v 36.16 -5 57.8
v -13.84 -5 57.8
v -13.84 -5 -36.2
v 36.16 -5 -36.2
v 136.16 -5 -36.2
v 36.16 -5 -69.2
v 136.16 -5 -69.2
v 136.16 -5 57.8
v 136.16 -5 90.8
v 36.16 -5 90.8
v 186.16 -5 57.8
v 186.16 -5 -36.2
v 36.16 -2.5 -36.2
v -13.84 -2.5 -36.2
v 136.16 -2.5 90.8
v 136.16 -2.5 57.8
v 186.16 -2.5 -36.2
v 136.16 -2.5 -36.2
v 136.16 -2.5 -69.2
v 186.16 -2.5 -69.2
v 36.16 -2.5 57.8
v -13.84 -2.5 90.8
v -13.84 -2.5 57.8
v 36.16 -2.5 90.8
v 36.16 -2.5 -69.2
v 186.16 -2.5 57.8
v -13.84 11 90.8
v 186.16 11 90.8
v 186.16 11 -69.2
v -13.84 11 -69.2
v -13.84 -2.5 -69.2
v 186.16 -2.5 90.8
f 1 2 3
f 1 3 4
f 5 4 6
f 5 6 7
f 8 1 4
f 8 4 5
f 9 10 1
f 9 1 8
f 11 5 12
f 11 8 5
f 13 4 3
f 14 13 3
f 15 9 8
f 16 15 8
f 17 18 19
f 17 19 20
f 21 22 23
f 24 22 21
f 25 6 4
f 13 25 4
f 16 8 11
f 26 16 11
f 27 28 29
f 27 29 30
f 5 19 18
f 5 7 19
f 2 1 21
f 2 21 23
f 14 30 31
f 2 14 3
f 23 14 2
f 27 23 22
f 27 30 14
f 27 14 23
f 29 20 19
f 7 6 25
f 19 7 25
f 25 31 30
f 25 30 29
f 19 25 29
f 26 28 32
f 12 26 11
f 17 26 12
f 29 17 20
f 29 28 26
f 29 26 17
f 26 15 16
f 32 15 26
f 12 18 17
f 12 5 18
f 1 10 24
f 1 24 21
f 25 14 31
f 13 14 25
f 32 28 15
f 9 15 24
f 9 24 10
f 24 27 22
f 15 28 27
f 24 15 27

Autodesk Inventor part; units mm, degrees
ref_plane "YZ Plane" through (0, 0, 0) normal (1, 0, 0) x (0, 1, 0)
ref_plane "XZ Plane" through (0, 0, 0) normal (0, 1, 0) x (-1, 0, 0)
ref_plane "XY Plane" through (0, 0, 0) normal (0, 0, 1) x (1, 0, 0)
sketch "Sketch1" plane through (0, 0, 0) normal (0, 1, 0) x (-1, 0, 0)
  line L0 (13.84, 90.8) -> (-186.16, 90.8)
  line L1 (-186.16, 90.8) -> (-186.16, -69.2)
  line L2 (-186.16, -69.2) -> (13.84, -69.2)
  line L3 (13.84, -69.2) -> (13.84, 90.8)
  point P0 (0, 0)
  dimension "d0" = 160
  dimension "d1" = 200
extrude "Extrusion1" add sketch "Sketch1" along normal blind 11
sketch "Sketch2" plane through (186.16, 0, 90.8) normal (1, 0, 0) x (0, 0, -1)
  line L0 (0, 0) -> (0, 11) projected
  line L1 (0, 0) -> (-12, 0)
  line L2 (-12, 0) -> (-12, 60)
  line L3 (-12, 60) -> (0, 60)
  line L4 (0, 60) -> (0, 0)
  line L5 (160, 0) -> (160, 11) projected
  line L6 (160, 0) -> (172, 0)
  line L7 (172, 0) -> (172, 60)
  line L8 (172, 60) -> (160, 60)
  line L9 (160, 60) -> (160, 0)
  point P0 (90.8, 0)
  point P1 (0, 11)
  dimension "d4" = 60
  dimension "d5" = 60
  dimension "d6" = 12
  dimension "d17" = 12
extrude "Extrusion2" add sketch "Sketch2" against normal up to surface (200 mm away)
sketch "Sketch3" plane through (0, 0, 0) normal (0, -1, 0) x (1, 0, 0)
  line L0 (186.16, 102.8) -> (186.16, -81.2) projected
  line L1 (186.16, 102.8) -> (-13.84, 102.8) projected
  line L2 (-13.84, -81.2) -> (-13.84, 102.8) projected
  line L3 (186.16, -81.2) -> (-13.84, -81.2) projected
  point P0 (0, 0)
extrude "Extrusion3" add sketch "Sketch3" along normal blind 5
sketch "Sketch7" plane through (0, 11, 0) normal (0, 1, 0) x (1, 0, 0)
  line L0 (186.16, -90.8) -> (-13.84, -90.8) projected
  line L1 (36.16, -90.8) -> (136.16, -90.8)
  line L2 (136.16, -90.8) -> (136.16, -65.8)
  line L3 (136.16, -65.8) -> (36.16, -65.8)
  line L4 (36.16, -65.8) -> (36.16, -90.8)
  line L5 (186.16, 69.2) -> (-13.84, 69.2) projected
  line L6 (36.16, 69.2) -> (136.16, 69.2)
  line L7 (136.16, 69.2) -> (136.16, 44.2)
  line L8 (136.16, 44.2) -> (36.16, 44.2)
  line L9 (36.16, 44.2) -> (36.16, 69.2)
  line L10 (-13.84, 69.2) -> (-13.84, -90.8) projected
  line L11 (186.16, -90.8) -> (186.16, 69.2) projected
  point P0 (0, 0)
  point P1 (136.16, 56.7)
  dimension "d18" = 25
  dimension "d19" = 25
  dimension "d20" = 50
  dimension "d21" = 50
  dimension "d22" = 50
  dimension "d23" = 50
extrude "Extrusion6" add sketch "Sketch7" along normal blind 10 contours L0 L4 L3 L2 | L7 L8 L9 L5
fillet "Fillet1" radius 4 4 edges at (36.16, 16, -69.2) (36.16, 16, 90.8) (136.16, 16, -69.2) (136.16, 16, 90.8)
fillet "Fillet2" radius 10 4 edges at (138.16, 21, -69.2) (34.16, 21, -69.2) (34.16, 21, 90.8) (138.16, 21, 90.8)
sketch "Sketch8" plane through (-13.84, 11, 90.8) normal (-1, 0, 0) x (0, 0, 1)
  line L0 (-160, 0) -> (0, 0)
  line L1 (0, 0) -> (0, -19)
  line L2 (0, -19) -> (-160, -19)
  line L3 (-160, -19) -> (-160, 0)
  line L4 (-172, 49) -> (12, 49)
  line L5 (12, 49) -> (12, -16)
  line L6 (12, -16) -> (-172, -16)
  line L7 (-172, -16) -> (-172, 49)
  point P0 (-90.8, -11)
  point P1 (0, -16)
  point P2 (-160, -16)
extrude "Extrusion7" cut sketch "Sketch8" against normal blind 1000 contours L3 L6 L7 L4 L5 L1 L0
sketch "Sketch10" plane through (0, -5, 0) normal (0, -1, 0) x (1, 0, 0)
  line L0 (186.16, -69.2) -> (-13.84, -69.2) projected
  line L1 (-13.84, -69.2) -> (36.16, -69.2)
  line L2 (36.16, -69.2) -> (36.16, -36.2)
  line L3 (36.16, -36.2) -> (-13.84, -36.2)
  line L4 (-13.84, -36.2) -> (-13.84, -69.2)
  line L5 (186.16, -69.2) -> (136.16, -69.2)
  line L6 (136.16, -69.2) -> (136.16, -36.2)
  line L7 (136.16, -36.2) -> (186.16, -36.2)
  line L8 (186.16, -36.2) -> (186.16, -69.2)
  line L9 (186.16, 90.8) -> (136.16, 90.8)
  line L10 (136.16, 90.8) -> (136.16, 57.8)
  line L11 (136.16, 57.8) -> (186.16, 57.8)
  line L12 (186.16, 57.8) -> (186.16, 90.8)
  line L13 (-13.84, 90.8) -> (36.16, 90.8)
  line L14 (36.16, 90.8) -> (36.16, 57.8)
  line L15 (36.16, 57.8) -> (-13.84, 57.8)
  line L16 (-13.84, 57.8) -> (-13.84, 90.8)
  line L17 (186.16, 90.8) -> (-13.84, 90.8) projected
  point P0 (0, 0)
  dimension "d30" = 50
  dimension "d31" = 50
  dimension "d32" = 50
  dimension "d33" = 50
  dimension "d34" = 33
  dimension "d35" = 33
  dimension "d36" = 0
extrude "Extrusion8" cut sketch "Sketch10" against normal blind 2.5
properties part number "Y_karetka" material "Aluminum 6061"
